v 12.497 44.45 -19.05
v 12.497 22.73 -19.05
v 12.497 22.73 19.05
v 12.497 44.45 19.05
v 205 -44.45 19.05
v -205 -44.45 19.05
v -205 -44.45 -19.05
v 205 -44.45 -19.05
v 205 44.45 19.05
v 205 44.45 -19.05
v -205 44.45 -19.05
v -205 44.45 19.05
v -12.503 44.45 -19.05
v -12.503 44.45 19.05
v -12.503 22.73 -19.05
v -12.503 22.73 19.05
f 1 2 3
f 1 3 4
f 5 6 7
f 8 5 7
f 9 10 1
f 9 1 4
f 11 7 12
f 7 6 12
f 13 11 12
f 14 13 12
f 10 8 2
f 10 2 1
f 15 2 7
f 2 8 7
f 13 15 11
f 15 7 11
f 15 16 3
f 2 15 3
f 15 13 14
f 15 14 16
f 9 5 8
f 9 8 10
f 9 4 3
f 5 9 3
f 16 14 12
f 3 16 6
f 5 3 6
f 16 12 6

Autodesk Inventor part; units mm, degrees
ref_plane "YZ Plane" through (0, 0, 0) normal (1, 0, 0) x (0, 1, 0)
ref_plane "XZ Plane" through (0, 0, 0) normal (0, 1, 0) x (-1, 0, 0)
ref_plane "XY Plane" through (0, 0, 0) normal (0, 0, 1) x (1, 0, 0)
sketch "Sketch1" plane through (0, 0, 0) normal (1, 0, 0) x (0, 1, 0)
  line L0 (44.45, 19.05) -> (-44.45, 19.05)
  line L1 (-44.45, 19.05) -> (-44.45, -19.05)
  line L2 (-44.45, -19.05) -> (44.45, -19.05)
  line L3 (44.45, -19.05) -> (44.45, 19.05)
  line L4 (44.45, 19.05) -> (-44.45, -19.05) construction
  line L5 (-44.45, 19.05) -> (44.45, -19.05) construction
  point P0 (0, 0)
  dimension "d0" = 88.9
  dimension "d1" = 38.1
extrude "Extrusion1" add sketch "Sketch1" along normal mid plane 410
sketch "Sketch2" plane through (-205, -44.45, 19.05) normal (0, 0, 1) x (1, 0, 0)
  line L0 (0, 88.9) -> (0, 0) projected
  line L1 (0, 67.1803) -> (192.497, 67.1803)
  line L2 (0, 88.9) -> (410, 88.9) projected
  line L3 (192.497, 88.9) -> (192.497, 67.1803)
  line L4 (192.497, 67.1803) -> (217.497, 67.1803)
  line L5 (217.497, 67.1803) -> (217.497, 88.9)
  point P0 (205, 44.45)
  dimension "d14" = 192.497
  dimension "d15" = 25
extrude "Extrusion2" cut sketch "Sketch2" against normal blind 166.2125 contours L2 L5 L4 L3
properties part number "CNC_1.1v_X_1(faceplate)"
